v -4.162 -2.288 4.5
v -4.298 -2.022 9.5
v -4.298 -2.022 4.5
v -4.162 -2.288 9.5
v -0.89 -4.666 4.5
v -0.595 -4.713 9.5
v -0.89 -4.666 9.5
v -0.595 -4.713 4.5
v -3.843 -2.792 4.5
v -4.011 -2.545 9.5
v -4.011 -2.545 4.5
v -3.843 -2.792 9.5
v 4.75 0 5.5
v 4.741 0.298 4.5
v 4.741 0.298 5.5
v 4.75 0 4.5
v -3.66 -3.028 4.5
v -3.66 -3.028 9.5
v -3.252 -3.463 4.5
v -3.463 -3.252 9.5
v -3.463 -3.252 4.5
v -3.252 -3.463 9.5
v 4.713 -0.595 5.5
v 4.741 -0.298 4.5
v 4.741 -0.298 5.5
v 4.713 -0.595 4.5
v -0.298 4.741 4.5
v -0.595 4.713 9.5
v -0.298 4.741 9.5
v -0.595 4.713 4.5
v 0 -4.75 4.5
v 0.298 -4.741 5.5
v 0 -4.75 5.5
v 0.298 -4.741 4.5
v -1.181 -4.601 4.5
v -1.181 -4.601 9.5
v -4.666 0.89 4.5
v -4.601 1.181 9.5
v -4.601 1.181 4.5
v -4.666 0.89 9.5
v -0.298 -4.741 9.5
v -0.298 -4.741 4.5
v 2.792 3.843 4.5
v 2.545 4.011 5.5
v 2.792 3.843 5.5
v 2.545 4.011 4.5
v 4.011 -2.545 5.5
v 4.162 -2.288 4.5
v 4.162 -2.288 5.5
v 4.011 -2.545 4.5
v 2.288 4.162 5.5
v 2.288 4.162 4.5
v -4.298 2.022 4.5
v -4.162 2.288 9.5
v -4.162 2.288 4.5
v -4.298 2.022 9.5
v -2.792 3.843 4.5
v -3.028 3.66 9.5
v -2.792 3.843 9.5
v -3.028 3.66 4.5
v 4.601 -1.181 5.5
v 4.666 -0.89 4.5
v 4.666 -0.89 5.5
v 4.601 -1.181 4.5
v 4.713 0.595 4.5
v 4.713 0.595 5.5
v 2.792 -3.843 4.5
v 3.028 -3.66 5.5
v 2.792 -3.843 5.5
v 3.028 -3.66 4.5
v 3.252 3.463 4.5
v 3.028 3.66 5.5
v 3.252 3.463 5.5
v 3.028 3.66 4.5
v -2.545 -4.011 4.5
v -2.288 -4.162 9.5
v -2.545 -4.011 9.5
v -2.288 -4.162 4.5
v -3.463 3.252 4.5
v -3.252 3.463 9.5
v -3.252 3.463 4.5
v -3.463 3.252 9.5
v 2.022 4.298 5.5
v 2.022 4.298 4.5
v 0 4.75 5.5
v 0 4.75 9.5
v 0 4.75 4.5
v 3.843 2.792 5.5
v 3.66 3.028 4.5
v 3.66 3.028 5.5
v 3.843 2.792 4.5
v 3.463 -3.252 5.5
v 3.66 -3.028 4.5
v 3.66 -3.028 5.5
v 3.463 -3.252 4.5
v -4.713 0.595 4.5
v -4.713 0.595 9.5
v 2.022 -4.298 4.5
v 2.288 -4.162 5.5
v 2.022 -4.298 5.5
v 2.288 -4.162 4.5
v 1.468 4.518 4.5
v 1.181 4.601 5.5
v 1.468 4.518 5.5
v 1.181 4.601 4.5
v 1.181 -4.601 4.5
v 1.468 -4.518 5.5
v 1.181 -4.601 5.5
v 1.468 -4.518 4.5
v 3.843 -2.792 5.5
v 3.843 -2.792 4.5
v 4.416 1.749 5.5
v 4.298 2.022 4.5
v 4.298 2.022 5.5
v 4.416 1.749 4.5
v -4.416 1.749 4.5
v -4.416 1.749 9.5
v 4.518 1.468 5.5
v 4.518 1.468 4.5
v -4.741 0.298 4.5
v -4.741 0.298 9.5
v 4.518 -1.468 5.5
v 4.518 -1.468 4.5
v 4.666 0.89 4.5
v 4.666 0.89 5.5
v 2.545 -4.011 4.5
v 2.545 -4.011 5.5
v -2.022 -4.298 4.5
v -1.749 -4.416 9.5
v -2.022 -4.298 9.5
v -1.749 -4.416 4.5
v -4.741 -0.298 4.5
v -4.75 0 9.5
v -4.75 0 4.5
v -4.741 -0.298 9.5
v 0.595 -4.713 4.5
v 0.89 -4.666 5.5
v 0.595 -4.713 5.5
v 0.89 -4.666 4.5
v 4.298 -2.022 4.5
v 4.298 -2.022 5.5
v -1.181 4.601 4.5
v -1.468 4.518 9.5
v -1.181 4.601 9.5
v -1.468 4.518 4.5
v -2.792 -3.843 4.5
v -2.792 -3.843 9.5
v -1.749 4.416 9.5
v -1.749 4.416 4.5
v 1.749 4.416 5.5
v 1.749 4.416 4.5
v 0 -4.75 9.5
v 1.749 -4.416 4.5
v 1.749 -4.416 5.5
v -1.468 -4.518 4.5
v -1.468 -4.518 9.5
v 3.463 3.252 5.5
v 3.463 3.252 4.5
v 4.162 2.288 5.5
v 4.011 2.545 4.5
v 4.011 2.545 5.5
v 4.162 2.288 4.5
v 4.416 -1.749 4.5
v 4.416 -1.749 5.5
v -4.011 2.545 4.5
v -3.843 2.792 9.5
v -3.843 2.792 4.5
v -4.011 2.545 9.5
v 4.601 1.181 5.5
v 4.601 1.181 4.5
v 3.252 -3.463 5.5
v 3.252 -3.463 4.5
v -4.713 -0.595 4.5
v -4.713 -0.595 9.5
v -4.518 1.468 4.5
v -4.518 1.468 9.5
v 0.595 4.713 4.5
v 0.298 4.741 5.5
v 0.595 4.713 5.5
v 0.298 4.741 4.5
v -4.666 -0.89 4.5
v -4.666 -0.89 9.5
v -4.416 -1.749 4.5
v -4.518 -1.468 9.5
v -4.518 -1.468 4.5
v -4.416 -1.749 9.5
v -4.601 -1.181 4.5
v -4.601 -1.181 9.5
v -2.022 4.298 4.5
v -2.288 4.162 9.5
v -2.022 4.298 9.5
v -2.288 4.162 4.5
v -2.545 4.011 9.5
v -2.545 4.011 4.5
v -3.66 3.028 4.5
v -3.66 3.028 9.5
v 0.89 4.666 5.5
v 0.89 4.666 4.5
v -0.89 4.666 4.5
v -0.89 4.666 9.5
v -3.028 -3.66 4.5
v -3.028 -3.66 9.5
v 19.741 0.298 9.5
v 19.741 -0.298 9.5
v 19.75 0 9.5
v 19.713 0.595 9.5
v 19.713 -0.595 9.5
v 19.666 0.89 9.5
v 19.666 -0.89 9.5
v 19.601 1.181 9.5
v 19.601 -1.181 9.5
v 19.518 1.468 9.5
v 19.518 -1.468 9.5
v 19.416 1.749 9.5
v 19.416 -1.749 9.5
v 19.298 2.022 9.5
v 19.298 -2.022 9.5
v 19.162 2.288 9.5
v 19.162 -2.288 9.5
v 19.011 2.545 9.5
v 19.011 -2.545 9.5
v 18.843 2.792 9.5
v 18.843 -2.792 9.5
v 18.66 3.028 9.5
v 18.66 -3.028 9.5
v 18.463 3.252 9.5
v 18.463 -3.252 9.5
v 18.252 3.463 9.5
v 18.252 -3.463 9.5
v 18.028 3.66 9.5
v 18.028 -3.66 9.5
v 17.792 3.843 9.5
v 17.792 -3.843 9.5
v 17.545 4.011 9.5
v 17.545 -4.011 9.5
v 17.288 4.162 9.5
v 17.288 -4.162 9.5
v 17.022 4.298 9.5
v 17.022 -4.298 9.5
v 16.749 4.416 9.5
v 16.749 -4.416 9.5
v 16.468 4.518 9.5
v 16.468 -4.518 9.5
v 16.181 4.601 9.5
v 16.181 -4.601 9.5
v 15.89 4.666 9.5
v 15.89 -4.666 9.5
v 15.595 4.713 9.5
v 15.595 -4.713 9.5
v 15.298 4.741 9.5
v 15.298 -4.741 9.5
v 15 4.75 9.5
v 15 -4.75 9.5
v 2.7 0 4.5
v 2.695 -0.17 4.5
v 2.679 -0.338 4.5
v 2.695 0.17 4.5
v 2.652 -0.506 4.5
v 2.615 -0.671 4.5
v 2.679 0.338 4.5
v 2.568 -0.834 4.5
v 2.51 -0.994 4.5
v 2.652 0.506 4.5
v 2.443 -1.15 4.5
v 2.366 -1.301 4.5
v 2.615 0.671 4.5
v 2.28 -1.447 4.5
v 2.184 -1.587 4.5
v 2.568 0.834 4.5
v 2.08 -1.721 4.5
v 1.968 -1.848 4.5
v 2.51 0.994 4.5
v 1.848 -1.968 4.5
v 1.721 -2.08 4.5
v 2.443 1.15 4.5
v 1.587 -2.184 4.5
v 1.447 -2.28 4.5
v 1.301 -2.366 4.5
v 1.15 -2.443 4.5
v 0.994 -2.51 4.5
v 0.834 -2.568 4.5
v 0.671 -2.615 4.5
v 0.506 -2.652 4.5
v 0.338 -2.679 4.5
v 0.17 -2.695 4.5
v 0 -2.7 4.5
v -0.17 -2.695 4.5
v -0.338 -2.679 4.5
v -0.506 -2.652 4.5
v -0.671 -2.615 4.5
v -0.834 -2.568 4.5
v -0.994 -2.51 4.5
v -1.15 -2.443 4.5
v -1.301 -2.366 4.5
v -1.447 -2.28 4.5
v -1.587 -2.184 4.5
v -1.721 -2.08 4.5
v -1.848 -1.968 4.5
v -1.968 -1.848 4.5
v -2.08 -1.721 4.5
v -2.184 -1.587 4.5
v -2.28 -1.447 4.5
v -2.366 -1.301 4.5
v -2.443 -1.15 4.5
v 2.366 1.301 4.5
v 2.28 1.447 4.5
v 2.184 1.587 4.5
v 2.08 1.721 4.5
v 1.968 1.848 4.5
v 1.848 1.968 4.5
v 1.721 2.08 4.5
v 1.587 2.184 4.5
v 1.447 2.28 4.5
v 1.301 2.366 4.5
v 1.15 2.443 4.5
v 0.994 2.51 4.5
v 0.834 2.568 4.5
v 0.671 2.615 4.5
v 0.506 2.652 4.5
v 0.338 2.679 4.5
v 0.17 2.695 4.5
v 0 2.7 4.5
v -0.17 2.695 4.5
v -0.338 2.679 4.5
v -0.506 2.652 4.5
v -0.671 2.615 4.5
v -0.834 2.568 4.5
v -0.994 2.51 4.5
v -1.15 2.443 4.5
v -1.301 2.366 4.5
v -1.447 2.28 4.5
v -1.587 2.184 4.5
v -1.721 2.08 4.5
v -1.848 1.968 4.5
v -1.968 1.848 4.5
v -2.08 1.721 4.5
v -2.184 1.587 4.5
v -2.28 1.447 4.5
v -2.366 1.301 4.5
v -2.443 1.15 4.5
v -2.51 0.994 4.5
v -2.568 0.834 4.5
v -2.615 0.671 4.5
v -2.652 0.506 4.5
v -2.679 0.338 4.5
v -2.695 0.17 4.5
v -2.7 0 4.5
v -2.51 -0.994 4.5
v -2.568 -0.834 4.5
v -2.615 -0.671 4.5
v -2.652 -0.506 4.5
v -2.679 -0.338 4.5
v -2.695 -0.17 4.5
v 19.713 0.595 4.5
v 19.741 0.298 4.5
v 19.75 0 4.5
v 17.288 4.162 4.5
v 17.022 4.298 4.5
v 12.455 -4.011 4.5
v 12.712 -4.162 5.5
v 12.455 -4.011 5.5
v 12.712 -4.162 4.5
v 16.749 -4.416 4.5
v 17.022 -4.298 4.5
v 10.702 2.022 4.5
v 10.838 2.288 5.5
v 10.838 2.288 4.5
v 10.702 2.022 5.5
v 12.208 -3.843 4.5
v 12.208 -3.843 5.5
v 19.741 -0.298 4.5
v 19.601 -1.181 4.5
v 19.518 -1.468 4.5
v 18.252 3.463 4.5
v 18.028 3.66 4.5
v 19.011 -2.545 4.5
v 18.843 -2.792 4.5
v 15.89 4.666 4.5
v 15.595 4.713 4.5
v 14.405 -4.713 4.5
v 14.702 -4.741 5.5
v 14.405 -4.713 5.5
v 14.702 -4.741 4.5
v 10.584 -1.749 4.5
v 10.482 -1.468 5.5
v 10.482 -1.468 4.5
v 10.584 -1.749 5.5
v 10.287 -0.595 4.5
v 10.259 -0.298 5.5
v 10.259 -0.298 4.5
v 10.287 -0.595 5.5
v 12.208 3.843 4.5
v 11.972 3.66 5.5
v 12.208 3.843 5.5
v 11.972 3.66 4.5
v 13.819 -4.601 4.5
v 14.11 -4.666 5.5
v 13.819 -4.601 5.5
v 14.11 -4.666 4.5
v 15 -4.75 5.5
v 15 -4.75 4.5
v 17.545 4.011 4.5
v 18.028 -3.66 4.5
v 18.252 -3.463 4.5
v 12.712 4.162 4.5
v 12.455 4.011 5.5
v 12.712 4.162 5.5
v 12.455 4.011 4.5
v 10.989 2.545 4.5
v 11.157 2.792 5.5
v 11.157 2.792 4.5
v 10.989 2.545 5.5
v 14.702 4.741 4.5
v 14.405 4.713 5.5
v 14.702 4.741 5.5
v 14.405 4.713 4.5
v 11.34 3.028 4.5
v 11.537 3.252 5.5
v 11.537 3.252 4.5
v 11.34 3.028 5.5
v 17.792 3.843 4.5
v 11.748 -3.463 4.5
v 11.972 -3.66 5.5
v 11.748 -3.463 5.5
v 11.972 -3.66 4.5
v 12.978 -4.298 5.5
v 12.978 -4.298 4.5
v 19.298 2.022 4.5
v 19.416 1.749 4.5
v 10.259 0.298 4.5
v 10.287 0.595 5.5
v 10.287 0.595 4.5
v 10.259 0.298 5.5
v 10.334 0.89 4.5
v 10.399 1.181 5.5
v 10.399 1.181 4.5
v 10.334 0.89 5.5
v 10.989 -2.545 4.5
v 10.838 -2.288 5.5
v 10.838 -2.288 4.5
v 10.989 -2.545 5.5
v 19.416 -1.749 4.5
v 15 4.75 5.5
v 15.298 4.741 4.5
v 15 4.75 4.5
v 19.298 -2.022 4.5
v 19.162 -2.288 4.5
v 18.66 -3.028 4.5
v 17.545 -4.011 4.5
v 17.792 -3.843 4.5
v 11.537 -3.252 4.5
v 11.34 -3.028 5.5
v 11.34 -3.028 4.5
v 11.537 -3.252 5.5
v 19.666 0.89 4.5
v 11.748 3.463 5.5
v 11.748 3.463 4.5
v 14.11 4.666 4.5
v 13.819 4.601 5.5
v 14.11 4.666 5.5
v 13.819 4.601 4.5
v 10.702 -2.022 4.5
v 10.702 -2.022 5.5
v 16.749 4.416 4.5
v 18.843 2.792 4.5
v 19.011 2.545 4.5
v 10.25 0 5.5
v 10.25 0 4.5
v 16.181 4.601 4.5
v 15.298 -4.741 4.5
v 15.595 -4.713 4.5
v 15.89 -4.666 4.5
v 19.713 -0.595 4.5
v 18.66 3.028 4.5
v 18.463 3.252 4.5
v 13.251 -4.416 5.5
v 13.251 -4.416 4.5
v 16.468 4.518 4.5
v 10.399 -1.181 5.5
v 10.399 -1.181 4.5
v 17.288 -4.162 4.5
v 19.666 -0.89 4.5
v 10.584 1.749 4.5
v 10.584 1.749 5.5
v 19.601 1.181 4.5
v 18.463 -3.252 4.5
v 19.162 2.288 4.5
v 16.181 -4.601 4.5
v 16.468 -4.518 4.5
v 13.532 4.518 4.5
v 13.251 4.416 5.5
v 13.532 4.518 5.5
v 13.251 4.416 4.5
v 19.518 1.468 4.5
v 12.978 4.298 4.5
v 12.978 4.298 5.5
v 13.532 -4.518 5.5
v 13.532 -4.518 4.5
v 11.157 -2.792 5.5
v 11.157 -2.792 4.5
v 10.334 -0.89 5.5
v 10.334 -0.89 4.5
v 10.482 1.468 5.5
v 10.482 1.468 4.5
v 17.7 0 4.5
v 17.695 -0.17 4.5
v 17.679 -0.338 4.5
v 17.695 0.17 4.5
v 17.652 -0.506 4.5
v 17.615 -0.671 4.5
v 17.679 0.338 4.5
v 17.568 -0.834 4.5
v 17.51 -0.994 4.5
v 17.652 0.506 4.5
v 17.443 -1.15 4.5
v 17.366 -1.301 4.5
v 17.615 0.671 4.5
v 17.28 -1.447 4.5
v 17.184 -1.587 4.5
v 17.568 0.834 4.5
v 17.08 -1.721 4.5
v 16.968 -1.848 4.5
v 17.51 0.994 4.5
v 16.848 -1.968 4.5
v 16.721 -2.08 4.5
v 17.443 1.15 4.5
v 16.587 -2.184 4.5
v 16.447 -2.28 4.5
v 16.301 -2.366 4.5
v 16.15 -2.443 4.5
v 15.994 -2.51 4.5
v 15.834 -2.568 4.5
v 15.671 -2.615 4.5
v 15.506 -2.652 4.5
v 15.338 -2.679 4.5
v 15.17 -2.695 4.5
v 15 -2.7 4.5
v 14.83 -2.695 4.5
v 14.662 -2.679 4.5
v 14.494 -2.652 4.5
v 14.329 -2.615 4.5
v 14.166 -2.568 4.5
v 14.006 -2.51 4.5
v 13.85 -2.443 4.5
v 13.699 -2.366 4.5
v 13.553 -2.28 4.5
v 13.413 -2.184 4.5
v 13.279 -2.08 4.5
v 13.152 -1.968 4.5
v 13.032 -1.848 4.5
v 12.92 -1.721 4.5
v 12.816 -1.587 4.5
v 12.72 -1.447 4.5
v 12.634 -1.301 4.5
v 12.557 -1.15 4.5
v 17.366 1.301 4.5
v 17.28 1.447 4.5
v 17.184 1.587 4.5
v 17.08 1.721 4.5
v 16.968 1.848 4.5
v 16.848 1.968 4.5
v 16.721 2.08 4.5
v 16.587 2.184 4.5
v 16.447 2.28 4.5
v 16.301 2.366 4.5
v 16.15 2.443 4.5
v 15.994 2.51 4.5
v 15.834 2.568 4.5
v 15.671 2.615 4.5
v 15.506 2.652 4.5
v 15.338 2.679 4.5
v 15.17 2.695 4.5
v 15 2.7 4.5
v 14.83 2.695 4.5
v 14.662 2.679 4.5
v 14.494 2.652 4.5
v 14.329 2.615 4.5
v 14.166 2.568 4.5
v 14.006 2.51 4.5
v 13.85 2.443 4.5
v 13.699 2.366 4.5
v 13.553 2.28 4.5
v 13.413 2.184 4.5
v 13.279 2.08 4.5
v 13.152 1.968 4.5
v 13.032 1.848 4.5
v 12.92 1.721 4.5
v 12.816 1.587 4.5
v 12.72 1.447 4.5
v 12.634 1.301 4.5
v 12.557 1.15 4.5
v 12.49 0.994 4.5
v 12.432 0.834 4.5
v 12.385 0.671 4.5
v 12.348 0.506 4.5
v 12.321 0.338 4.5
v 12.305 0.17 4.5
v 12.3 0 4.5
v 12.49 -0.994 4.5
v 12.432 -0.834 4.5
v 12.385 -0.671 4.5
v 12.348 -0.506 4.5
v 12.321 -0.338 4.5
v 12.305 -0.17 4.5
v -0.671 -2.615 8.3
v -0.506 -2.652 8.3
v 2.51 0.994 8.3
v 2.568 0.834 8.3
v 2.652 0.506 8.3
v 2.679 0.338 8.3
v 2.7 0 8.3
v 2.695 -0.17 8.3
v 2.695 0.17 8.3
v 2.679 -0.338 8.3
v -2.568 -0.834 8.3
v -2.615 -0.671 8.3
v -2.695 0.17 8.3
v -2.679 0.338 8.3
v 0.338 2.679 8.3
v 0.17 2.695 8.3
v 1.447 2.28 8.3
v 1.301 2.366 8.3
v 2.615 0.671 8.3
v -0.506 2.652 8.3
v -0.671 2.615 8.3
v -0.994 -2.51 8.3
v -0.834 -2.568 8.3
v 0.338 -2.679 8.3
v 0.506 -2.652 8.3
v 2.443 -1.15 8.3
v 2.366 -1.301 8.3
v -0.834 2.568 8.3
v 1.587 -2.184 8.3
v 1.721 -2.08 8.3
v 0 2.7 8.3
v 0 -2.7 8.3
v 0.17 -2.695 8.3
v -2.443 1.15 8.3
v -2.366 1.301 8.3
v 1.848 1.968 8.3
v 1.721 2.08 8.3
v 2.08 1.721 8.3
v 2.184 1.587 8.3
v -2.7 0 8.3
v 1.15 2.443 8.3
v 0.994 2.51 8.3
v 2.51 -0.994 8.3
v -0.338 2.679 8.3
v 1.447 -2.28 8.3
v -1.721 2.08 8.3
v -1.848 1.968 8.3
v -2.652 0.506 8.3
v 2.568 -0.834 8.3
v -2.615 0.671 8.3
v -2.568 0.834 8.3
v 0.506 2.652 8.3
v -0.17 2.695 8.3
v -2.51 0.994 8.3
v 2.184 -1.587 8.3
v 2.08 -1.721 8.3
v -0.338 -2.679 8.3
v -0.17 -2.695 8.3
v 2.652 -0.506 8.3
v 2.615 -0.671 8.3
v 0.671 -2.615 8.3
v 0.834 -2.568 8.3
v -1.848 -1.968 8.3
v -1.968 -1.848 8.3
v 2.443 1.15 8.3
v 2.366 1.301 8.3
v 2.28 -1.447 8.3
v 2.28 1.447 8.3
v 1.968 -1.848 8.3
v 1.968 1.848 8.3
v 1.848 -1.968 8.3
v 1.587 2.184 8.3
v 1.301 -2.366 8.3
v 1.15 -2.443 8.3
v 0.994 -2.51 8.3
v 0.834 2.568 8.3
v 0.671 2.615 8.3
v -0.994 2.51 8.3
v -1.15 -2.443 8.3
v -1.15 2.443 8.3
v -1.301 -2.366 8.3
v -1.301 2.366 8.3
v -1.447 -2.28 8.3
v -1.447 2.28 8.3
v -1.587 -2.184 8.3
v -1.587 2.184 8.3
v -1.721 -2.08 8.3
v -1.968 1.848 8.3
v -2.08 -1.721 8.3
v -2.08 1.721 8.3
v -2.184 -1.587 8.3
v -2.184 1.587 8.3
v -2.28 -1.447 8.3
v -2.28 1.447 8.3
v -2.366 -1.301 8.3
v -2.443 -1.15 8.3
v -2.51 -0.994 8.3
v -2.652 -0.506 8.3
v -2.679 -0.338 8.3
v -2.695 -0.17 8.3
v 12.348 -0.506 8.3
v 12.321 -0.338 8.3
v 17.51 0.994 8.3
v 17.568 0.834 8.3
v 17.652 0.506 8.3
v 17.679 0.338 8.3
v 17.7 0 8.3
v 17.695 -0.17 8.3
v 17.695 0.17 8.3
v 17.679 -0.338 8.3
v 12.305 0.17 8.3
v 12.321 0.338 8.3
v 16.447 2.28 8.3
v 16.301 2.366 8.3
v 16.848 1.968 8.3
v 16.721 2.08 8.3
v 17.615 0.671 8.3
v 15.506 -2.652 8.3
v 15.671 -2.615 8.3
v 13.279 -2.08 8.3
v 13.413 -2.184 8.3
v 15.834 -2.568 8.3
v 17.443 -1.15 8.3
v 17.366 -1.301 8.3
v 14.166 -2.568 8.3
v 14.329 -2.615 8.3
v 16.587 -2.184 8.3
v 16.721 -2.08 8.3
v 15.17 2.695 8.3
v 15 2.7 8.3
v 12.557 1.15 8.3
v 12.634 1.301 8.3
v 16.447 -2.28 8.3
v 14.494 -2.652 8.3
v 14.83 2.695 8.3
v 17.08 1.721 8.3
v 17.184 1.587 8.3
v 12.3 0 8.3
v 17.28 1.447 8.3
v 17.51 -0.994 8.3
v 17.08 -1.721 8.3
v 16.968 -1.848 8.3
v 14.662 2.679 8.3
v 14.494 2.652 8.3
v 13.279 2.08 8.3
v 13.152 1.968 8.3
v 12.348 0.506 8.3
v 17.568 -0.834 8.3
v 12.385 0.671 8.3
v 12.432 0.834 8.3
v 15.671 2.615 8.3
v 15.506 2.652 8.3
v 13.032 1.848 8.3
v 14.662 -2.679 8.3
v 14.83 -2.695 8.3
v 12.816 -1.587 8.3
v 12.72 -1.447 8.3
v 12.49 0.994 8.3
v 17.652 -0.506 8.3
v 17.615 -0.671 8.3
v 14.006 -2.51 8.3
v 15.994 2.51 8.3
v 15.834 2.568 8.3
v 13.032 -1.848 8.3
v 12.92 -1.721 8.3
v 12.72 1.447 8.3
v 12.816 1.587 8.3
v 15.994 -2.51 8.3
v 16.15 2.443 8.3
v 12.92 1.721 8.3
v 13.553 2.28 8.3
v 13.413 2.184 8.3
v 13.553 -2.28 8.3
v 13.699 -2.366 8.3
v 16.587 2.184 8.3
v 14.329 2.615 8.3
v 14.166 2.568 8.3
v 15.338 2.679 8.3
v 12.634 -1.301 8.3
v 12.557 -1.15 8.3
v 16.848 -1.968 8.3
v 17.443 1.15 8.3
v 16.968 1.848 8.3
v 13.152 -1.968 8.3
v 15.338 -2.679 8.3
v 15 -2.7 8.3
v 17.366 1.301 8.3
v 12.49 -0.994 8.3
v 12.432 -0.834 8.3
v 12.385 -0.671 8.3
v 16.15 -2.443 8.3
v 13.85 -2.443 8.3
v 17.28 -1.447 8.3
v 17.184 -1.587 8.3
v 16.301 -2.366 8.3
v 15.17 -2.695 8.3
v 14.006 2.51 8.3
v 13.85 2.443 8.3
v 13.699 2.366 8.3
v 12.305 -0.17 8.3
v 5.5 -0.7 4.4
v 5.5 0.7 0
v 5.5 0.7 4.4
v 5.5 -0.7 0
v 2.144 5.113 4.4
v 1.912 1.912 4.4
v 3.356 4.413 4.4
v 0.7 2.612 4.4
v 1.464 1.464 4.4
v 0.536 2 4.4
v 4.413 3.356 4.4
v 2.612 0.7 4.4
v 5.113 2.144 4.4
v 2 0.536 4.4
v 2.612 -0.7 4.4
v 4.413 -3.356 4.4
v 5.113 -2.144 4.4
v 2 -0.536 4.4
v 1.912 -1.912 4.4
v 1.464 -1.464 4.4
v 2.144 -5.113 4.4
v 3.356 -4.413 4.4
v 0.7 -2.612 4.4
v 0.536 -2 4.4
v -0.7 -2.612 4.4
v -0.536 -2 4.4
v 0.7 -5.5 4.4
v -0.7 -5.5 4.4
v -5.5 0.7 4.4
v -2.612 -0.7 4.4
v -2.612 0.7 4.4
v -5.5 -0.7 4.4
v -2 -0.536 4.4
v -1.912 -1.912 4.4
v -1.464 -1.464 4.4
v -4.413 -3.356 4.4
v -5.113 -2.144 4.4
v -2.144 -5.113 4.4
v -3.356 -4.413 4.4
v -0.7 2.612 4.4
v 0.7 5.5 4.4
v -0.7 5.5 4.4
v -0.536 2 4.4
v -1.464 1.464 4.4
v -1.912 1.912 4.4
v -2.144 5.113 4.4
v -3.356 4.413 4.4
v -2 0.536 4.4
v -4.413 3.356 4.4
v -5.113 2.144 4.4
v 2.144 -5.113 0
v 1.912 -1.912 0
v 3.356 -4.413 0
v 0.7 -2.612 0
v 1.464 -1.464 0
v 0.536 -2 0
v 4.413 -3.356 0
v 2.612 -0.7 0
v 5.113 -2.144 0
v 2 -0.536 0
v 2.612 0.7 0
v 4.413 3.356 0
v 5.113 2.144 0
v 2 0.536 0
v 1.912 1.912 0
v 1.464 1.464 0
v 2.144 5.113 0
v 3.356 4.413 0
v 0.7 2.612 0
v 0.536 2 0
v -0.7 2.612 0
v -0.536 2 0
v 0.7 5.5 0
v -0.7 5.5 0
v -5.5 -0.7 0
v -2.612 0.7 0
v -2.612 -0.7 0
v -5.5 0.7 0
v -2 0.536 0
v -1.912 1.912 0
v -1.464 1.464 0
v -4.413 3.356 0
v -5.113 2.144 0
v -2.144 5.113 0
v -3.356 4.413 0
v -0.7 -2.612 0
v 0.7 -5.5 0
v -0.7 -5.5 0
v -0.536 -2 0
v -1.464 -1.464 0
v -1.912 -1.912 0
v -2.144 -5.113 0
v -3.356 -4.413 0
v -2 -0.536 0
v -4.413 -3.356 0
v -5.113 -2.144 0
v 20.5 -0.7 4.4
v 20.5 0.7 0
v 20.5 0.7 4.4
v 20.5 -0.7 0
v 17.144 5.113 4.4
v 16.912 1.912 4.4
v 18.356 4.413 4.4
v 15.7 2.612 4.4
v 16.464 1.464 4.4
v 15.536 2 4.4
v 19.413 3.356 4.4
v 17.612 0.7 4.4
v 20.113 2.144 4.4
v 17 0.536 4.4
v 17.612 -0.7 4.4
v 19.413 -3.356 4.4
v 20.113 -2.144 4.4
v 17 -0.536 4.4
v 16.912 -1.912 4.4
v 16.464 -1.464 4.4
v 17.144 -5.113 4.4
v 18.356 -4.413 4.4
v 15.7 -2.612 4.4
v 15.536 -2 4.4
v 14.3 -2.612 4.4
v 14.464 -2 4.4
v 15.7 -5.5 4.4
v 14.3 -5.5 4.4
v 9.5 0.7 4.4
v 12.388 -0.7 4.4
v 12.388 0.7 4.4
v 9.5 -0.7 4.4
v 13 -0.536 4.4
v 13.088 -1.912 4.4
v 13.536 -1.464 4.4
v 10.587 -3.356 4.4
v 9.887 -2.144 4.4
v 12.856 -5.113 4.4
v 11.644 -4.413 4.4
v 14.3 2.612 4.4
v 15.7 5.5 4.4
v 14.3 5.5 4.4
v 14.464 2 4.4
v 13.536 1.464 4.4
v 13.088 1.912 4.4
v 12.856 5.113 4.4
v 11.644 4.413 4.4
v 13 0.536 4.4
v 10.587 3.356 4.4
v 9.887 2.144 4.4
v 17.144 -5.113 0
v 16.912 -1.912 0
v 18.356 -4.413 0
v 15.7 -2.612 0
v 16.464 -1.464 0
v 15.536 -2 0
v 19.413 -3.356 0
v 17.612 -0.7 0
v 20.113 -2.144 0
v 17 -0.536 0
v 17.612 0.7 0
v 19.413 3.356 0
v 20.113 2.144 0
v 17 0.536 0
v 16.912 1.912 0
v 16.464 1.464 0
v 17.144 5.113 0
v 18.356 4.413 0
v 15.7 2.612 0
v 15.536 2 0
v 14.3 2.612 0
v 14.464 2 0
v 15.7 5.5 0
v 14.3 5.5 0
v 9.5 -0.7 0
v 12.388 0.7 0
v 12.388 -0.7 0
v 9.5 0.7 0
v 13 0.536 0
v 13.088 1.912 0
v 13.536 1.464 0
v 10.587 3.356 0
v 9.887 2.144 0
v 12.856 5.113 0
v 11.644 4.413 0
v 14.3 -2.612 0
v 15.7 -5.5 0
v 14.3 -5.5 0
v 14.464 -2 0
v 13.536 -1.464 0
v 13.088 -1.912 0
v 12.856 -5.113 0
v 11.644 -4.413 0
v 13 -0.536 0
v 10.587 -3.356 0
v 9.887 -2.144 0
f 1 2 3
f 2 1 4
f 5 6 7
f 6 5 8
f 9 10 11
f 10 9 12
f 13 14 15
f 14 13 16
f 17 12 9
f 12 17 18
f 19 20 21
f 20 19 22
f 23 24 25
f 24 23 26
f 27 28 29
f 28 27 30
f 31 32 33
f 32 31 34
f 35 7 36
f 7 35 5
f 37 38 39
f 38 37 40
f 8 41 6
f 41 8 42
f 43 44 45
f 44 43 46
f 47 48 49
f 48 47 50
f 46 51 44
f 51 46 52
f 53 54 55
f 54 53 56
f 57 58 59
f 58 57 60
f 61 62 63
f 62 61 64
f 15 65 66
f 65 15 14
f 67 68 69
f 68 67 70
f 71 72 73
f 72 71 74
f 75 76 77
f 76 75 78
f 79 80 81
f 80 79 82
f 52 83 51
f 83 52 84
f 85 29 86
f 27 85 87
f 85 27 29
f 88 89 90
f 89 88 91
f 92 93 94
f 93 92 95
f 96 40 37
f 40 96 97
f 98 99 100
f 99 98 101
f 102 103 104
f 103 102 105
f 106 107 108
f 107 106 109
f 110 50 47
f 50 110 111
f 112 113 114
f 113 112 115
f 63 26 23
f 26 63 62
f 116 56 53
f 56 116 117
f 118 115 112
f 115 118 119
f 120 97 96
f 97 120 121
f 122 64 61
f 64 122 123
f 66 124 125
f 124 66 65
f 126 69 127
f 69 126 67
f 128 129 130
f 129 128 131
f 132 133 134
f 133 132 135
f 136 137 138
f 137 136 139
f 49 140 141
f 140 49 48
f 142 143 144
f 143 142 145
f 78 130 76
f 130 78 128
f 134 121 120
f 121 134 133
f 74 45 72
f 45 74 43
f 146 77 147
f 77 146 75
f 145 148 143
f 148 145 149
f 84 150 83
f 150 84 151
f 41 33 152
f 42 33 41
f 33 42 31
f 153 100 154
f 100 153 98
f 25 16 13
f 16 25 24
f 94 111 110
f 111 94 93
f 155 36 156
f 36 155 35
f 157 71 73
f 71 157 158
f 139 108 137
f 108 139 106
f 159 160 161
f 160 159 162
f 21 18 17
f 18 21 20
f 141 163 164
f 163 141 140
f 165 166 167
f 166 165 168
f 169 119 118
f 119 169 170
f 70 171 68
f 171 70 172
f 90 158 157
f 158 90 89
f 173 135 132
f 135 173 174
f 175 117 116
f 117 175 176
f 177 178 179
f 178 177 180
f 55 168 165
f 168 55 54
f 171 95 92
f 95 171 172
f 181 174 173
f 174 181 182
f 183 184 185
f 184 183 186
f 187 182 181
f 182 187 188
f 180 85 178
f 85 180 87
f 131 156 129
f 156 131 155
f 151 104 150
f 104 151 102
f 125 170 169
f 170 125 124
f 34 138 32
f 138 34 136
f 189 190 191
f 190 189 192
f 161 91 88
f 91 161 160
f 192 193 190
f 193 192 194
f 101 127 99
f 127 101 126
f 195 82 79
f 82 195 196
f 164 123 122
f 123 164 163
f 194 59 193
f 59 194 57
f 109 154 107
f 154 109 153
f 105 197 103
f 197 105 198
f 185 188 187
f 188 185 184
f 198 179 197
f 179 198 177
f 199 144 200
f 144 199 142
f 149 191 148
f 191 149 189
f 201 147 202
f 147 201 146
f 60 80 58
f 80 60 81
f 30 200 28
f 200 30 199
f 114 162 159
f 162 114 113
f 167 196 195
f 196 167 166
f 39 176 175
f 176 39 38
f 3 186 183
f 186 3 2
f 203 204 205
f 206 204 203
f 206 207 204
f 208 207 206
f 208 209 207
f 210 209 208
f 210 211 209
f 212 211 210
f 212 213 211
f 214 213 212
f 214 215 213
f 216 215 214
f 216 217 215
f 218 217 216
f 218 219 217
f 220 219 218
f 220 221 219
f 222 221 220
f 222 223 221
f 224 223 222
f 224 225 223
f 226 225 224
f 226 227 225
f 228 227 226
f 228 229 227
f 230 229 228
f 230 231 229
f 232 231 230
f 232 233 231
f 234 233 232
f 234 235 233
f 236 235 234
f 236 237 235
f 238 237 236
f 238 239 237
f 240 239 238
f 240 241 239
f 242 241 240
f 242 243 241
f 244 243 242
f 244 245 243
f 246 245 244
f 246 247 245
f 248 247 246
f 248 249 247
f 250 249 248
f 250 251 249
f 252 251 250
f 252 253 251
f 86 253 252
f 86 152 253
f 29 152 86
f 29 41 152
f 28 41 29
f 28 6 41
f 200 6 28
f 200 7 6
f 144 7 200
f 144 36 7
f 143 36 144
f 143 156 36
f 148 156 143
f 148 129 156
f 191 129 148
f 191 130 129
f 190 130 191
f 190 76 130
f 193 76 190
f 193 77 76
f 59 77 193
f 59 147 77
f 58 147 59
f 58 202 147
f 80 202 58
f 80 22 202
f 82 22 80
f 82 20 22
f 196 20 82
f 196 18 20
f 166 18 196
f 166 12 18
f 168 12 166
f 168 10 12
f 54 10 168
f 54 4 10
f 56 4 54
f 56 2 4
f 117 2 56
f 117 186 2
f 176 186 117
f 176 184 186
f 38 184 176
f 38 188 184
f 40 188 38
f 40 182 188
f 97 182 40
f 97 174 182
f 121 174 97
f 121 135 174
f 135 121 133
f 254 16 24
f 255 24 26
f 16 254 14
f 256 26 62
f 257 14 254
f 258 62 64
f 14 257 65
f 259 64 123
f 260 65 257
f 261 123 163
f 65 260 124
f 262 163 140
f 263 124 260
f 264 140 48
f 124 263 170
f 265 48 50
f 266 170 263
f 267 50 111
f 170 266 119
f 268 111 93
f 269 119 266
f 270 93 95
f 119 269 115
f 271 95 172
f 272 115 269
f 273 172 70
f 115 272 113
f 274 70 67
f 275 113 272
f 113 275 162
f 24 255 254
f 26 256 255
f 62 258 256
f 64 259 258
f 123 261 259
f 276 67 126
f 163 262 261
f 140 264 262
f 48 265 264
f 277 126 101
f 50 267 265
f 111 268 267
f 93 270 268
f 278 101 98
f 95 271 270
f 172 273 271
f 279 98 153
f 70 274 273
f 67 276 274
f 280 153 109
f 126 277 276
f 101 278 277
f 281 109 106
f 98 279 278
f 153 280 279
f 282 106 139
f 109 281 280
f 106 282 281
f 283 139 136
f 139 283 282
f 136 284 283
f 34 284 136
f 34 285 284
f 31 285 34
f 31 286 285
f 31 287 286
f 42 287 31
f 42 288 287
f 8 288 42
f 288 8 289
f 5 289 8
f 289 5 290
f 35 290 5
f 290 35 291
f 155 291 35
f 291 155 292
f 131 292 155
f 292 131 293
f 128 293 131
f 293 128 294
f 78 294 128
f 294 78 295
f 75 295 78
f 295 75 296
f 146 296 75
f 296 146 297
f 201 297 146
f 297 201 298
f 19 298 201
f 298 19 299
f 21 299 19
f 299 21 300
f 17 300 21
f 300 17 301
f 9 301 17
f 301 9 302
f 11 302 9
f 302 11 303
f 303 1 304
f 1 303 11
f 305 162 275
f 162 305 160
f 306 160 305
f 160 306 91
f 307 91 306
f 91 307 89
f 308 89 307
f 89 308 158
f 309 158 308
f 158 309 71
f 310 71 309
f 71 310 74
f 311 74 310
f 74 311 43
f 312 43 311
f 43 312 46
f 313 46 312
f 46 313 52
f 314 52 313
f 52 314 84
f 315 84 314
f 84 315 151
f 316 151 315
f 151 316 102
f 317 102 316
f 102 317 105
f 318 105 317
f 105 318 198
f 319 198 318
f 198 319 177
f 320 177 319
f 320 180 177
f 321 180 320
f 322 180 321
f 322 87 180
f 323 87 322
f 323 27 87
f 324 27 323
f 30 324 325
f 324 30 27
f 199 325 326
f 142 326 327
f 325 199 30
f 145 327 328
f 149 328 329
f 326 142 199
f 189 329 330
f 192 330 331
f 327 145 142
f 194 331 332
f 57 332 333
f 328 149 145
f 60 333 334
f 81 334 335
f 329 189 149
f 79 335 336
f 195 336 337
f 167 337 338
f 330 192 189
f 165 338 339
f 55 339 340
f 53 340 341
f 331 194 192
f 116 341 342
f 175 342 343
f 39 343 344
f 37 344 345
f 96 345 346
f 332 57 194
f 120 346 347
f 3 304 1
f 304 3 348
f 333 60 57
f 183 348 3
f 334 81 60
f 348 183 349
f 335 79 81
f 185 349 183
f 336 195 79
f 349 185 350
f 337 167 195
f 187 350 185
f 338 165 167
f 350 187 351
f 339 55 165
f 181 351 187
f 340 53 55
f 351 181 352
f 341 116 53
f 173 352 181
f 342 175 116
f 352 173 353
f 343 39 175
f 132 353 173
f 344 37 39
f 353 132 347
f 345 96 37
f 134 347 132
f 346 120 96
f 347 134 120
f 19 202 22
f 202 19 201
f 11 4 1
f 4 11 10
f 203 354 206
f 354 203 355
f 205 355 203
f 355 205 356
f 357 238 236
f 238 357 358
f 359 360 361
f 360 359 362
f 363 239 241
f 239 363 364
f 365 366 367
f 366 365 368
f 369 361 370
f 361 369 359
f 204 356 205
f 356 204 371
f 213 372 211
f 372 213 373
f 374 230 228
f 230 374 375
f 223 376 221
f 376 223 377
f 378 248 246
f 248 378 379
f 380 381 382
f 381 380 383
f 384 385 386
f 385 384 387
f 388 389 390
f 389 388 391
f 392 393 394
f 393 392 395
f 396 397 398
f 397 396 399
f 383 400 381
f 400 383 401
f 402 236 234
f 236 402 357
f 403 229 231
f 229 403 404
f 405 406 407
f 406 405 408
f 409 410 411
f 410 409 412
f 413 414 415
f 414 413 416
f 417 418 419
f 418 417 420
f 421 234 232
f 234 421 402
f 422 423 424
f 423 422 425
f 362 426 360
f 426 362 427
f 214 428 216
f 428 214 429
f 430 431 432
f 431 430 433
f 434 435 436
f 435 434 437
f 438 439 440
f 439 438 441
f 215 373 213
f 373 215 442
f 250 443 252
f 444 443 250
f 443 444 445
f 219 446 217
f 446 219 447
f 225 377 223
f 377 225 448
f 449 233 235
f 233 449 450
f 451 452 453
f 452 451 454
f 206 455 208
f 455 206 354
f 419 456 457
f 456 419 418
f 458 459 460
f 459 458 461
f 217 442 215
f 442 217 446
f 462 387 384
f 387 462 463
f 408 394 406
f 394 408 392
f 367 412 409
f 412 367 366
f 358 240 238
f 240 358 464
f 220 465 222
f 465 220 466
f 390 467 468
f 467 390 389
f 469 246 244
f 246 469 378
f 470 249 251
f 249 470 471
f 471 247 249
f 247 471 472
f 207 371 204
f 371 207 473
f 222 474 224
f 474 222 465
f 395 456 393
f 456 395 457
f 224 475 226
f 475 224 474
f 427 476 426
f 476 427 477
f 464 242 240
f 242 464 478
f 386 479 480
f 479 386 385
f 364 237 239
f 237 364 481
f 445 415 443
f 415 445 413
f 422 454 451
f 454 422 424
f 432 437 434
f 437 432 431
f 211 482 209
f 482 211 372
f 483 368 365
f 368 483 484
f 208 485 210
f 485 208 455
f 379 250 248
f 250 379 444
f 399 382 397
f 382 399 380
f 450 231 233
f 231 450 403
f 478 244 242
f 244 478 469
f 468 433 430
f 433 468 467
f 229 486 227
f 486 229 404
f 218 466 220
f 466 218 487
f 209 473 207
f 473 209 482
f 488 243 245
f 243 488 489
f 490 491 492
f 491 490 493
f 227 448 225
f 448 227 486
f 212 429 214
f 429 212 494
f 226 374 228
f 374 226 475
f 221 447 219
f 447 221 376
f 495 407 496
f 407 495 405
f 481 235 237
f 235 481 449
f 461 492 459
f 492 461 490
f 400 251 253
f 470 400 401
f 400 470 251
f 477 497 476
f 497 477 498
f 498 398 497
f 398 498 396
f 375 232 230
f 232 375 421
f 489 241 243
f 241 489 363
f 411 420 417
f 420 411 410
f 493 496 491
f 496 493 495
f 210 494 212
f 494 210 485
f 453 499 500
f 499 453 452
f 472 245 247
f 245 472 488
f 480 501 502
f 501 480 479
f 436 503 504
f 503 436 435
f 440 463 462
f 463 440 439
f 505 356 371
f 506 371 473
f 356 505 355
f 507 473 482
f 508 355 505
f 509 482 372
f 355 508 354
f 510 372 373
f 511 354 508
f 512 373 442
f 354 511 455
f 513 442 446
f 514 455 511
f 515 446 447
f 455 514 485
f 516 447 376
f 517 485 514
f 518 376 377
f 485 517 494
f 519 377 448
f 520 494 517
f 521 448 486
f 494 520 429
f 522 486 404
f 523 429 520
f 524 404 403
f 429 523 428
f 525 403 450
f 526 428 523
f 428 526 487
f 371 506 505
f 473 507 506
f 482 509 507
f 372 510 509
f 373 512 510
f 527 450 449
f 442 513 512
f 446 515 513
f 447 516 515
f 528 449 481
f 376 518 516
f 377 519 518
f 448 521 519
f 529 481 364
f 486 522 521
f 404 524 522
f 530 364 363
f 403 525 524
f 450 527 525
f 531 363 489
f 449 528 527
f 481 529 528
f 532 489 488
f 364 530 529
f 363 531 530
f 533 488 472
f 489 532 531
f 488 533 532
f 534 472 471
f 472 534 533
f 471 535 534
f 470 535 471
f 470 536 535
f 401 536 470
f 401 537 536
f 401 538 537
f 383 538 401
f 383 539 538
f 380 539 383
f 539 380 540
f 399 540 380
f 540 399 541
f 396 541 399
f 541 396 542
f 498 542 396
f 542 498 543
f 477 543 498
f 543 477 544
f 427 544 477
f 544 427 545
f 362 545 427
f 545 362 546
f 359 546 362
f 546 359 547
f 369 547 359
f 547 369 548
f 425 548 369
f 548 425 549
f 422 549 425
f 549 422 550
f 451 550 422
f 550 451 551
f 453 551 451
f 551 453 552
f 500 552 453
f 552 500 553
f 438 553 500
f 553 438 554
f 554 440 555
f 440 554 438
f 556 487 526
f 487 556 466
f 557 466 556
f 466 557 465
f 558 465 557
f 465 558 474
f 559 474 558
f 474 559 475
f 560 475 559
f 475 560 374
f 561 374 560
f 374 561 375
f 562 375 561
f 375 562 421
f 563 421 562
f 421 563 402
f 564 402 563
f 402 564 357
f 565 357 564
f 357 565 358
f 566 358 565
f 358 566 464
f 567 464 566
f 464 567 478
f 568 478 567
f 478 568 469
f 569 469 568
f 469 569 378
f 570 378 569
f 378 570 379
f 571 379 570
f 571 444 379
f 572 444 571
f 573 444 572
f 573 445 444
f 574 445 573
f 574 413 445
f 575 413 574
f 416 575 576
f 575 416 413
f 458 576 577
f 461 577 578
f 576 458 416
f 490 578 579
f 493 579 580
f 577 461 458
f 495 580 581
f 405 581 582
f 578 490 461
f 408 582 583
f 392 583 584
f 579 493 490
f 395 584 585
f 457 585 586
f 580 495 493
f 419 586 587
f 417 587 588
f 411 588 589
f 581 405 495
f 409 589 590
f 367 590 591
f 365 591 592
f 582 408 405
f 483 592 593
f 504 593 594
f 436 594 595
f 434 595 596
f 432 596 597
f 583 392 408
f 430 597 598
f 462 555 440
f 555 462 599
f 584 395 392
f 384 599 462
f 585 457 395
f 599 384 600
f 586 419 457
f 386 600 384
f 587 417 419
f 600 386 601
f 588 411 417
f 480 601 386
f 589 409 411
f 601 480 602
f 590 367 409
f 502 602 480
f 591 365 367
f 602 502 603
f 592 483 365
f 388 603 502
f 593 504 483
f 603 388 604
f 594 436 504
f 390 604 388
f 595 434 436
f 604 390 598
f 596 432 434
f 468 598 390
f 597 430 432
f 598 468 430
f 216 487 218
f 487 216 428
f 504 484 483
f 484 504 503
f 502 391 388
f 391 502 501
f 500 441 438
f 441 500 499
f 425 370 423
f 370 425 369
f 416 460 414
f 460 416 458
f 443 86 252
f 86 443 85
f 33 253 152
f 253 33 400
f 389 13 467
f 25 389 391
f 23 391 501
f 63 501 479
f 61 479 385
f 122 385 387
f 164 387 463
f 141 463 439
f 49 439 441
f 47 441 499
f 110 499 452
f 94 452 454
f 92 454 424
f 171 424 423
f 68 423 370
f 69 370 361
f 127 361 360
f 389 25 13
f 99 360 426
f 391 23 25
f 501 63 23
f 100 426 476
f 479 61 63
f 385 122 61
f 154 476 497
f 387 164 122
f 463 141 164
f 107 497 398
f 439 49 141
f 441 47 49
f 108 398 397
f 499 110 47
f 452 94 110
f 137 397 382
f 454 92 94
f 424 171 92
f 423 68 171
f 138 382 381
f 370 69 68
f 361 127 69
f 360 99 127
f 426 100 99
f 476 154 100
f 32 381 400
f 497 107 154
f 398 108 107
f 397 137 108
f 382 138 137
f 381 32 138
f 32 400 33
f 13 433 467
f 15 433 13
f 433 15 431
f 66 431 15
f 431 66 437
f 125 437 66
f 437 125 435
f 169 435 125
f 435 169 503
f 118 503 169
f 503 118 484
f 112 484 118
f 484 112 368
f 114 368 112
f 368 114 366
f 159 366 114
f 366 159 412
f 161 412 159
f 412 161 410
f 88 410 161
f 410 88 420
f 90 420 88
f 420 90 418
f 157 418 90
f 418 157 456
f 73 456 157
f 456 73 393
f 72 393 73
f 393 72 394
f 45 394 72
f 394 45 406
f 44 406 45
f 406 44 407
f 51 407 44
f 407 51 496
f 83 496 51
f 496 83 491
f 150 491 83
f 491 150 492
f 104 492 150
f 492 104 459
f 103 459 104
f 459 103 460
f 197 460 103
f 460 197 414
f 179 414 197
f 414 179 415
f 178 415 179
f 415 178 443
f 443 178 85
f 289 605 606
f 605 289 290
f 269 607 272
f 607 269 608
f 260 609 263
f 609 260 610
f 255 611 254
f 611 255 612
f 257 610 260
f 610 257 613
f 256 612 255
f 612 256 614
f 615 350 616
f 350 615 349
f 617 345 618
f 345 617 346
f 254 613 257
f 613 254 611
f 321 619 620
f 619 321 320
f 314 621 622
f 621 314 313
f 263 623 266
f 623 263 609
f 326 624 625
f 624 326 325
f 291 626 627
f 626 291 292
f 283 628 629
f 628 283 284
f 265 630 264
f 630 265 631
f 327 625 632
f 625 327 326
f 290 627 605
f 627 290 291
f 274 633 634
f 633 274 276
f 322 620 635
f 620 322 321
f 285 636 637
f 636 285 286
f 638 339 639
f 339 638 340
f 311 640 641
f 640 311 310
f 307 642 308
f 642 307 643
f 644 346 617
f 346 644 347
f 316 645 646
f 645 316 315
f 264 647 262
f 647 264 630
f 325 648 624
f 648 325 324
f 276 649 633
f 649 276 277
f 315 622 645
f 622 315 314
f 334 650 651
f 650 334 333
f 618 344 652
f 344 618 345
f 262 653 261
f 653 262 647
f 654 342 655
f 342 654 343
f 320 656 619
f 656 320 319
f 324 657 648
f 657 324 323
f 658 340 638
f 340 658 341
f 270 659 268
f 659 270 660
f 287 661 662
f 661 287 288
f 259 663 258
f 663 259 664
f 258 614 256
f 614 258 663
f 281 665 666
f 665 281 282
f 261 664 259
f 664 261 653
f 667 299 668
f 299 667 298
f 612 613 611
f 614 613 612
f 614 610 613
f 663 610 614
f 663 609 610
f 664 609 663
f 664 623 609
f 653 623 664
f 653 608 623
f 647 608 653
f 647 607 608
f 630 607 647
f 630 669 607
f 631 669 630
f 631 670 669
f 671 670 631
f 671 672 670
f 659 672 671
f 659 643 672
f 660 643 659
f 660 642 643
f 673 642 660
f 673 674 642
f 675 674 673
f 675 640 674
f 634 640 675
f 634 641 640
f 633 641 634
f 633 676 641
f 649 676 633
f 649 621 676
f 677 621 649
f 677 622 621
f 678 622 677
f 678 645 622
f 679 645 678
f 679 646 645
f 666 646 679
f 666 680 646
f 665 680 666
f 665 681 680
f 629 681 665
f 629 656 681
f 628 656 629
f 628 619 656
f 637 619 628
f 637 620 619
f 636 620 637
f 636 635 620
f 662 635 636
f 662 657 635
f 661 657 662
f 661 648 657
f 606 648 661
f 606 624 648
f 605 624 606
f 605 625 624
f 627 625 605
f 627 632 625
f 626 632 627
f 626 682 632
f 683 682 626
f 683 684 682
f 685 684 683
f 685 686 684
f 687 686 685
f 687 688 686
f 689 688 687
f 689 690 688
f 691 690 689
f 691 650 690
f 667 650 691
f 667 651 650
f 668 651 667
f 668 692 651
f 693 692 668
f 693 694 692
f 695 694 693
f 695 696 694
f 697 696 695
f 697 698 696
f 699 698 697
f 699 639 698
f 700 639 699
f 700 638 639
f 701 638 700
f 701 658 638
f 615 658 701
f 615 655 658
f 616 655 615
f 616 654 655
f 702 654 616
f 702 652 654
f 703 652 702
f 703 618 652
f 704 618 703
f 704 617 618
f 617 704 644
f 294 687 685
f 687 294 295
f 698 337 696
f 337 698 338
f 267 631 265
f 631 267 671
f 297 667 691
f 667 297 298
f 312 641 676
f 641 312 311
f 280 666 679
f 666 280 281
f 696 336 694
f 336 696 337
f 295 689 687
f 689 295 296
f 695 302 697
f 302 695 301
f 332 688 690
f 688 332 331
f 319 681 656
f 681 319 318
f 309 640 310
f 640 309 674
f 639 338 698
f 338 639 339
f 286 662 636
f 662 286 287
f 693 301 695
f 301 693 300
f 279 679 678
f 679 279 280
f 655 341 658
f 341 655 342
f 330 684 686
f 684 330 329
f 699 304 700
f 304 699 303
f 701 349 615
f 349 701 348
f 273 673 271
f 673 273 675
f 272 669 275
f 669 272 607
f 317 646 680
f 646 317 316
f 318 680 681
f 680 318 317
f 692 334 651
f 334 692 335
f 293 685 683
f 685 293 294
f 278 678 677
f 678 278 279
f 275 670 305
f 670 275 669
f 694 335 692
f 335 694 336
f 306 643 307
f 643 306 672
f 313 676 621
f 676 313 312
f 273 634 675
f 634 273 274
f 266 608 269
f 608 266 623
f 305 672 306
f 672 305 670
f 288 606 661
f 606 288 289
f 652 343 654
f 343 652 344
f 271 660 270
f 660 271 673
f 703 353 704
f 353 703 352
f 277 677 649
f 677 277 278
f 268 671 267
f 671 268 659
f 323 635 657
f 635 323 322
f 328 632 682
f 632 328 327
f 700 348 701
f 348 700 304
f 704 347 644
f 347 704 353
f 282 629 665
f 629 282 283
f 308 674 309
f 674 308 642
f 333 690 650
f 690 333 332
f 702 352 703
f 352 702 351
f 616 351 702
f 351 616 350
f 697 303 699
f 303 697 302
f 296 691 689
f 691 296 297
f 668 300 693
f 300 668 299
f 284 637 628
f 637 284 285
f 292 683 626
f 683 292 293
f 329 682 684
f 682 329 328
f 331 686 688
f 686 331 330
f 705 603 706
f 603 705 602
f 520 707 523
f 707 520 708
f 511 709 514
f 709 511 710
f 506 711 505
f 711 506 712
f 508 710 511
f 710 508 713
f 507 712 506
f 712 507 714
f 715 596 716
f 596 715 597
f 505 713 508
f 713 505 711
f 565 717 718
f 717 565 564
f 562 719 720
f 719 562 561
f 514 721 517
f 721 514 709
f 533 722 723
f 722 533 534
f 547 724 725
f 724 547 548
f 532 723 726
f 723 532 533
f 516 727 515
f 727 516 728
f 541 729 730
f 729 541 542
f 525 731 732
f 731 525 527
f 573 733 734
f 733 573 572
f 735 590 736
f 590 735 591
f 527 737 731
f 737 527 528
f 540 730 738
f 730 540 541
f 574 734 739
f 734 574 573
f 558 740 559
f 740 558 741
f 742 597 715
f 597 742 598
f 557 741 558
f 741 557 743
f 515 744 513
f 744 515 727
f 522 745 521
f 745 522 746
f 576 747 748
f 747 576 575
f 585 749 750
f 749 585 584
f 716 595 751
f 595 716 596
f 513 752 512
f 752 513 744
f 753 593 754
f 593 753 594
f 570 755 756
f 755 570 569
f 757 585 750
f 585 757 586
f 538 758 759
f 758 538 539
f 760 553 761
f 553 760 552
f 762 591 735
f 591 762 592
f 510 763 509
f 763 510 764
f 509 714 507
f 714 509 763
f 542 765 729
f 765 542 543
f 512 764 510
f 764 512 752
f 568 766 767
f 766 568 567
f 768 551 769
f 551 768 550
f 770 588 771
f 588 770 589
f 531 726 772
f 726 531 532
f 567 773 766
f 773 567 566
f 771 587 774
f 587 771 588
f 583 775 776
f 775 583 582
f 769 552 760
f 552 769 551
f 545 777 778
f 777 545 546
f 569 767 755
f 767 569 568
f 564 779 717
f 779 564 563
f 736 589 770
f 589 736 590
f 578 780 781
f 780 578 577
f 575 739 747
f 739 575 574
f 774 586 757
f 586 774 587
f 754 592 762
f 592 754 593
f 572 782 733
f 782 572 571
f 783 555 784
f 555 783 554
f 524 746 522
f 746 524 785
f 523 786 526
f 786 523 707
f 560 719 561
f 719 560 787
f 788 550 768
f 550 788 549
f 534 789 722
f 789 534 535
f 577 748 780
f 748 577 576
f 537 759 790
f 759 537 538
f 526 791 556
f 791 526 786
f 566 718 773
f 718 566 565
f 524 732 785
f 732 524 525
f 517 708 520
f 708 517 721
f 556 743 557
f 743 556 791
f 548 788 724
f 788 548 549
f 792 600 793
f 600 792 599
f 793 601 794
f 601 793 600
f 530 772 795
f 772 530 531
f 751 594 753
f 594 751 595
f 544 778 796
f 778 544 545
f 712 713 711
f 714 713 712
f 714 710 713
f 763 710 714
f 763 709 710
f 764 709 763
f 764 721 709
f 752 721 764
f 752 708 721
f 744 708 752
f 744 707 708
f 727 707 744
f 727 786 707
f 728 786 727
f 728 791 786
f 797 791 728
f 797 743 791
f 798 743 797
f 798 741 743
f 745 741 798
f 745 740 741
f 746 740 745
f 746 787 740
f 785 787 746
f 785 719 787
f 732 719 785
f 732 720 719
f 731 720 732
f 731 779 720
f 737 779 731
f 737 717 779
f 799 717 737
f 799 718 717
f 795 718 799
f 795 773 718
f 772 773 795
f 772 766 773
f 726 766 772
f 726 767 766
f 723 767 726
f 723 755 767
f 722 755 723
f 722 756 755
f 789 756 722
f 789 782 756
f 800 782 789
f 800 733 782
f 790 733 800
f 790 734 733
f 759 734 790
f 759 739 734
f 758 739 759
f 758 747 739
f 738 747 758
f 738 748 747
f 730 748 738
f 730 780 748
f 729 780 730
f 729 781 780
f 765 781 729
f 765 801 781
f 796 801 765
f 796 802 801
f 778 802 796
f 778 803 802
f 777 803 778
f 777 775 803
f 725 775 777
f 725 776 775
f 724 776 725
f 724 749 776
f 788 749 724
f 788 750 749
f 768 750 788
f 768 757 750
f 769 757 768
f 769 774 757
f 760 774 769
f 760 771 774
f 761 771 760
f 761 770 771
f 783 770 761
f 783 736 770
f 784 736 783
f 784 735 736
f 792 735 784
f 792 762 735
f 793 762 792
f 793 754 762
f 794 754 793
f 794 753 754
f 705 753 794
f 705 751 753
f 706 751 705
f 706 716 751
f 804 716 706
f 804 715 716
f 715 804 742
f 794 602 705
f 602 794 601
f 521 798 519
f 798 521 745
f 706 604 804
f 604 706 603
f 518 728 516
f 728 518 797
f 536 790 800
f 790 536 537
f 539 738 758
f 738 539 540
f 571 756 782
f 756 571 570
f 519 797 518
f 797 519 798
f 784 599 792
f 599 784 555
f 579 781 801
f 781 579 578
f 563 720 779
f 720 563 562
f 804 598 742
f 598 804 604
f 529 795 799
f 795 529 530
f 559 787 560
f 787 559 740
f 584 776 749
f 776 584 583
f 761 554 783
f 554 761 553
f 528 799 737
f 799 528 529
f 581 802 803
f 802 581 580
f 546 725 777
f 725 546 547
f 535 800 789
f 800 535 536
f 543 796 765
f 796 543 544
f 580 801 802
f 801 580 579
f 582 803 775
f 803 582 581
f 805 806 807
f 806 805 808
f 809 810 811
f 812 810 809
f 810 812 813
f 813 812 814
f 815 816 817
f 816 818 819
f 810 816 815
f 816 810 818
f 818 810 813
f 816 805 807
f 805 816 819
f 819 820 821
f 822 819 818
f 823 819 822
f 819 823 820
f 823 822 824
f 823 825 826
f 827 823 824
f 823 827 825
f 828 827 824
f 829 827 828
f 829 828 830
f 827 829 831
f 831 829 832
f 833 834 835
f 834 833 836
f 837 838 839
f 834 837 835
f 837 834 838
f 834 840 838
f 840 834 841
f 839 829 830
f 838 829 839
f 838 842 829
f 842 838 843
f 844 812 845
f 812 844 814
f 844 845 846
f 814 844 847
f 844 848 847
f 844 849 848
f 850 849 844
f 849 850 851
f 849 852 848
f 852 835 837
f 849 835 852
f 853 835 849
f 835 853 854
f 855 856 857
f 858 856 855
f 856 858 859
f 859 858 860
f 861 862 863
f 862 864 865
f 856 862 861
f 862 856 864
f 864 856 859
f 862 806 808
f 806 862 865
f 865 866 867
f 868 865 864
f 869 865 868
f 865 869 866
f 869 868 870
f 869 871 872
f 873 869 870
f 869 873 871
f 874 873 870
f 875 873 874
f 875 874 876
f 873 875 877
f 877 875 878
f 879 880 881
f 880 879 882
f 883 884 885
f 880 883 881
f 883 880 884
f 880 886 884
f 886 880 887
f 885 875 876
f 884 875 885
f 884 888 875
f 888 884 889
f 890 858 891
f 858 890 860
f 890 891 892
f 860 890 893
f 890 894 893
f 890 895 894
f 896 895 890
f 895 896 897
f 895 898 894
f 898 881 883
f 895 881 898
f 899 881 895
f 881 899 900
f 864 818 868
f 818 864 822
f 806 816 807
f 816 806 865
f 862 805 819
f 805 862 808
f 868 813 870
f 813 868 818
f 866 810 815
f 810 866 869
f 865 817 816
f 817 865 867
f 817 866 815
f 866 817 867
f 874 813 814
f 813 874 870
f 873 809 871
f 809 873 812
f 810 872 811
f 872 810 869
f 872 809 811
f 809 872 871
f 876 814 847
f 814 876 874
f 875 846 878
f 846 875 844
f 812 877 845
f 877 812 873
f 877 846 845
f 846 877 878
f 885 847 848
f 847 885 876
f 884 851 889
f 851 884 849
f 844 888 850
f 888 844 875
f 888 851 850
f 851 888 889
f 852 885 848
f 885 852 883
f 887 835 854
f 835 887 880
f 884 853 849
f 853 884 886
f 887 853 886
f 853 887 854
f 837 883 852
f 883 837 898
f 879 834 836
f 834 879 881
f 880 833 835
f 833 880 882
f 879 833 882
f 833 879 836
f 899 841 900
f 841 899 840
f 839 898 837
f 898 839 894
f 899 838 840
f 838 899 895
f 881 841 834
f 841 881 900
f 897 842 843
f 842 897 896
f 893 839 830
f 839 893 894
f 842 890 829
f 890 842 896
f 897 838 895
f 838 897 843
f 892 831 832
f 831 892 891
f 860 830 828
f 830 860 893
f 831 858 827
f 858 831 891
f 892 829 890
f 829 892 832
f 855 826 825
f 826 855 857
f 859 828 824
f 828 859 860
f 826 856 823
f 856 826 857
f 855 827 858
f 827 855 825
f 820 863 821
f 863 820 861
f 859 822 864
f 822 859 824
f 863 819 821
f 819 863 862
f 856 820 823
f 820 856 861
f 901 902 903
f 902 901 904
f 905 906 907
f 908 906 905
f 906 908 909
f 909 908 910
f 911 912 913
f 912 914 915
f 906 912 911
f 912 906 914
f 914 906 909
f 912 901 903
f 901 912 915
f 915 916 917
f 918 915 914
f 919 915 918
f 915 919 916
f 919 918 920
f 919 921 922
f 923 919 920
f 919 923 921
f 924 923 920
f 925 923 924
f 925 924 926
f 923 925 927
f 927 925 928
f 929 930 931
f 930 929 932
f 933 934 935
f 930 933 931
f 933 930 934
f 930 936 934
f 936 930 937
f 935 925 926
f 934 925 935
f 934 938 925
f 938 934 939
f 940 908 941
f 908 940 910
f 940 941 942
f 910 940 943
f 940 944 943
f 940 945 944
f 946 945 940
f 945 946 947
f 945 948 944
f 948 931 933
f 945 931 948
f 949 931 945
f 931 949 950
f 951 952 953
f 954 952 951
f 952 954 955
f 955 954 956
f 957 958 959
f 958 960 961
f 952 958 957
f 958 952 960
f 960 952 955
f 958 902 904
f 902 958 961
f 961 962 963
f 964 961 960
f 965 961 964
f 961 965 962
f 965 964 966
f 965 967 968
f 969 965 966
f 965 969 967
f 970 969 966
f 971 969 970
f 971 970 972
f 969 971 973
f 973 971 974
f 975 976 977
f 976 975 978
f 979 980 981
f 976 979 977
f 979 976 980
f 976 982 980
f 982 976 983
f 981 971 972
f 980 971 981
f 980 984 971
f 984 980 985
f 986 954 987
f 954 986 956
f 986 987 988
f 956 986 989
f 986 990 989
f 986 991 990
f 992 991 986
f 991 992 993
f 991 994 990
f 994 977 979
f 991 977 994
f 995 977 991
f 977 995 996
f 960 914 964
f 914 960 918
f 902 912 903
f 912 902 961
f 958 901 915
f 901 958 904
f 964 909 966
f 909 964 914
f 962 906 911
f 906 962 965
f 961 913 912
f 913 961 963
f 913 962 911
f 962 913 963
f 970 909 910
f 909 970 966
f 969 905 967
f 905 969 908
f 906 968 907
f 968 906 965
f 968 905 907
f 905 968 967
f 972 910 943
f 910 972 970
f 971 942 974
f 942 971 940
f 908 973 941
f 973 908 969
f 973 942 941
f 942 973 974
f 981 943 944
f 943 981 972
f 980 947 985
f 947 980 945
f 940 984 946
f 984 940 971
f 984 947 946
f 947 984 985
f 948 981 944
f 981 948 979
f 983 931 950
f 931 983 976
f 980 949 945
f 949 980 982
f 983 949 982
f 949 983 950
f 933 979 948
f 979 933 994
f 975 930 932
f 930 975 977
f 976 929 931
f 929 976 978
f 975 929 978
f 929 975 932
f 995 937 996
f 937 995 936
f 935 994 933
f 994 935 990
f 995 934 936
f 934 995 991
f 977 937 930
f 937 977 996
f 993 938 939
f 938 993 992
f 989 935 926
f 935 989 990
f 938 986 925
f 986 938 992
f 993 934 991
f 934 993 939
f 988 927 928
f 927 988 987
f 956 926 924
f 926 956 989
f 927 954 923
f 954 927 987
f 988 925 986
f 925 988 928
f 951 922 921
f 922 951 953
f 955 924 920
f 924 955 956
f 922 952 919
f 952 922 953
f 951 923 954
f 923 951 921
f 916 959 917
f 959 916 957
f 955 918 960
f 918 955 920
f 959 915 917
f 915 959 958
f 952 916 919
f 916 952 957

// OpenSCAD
$fn=100;

module column() {
  translate([0, 0, 4.5])
  difference() {
    union() {
      linear_extrude(height=5)
      circle(d=9.5);

      translate([15, 0, 0])
      linear_extrude(height=5)
      circle(d=9.5);

      translate([0, 0, 1])
      linear_extrude(height=4)
      hull() {
        circle(d=9.5);

        translate([15, 0, 0])
        circle(d=9.5);
      }
    }

    linear_extrude(height=3.8)
    circle(d=5.4);

    translate([15, 0, 0])
    linear_extrude(height=3.8)
    circle(d=5.4);
  }
}

column();

module support() {
  for (r = [0:30:360]) {
    rotate([0, 0, r])
    translate([2, -0.7, 0])
    cube([3.5, 1.4, 4.4]);
  }
}

support();
translate([15, 0, 0])
support();
